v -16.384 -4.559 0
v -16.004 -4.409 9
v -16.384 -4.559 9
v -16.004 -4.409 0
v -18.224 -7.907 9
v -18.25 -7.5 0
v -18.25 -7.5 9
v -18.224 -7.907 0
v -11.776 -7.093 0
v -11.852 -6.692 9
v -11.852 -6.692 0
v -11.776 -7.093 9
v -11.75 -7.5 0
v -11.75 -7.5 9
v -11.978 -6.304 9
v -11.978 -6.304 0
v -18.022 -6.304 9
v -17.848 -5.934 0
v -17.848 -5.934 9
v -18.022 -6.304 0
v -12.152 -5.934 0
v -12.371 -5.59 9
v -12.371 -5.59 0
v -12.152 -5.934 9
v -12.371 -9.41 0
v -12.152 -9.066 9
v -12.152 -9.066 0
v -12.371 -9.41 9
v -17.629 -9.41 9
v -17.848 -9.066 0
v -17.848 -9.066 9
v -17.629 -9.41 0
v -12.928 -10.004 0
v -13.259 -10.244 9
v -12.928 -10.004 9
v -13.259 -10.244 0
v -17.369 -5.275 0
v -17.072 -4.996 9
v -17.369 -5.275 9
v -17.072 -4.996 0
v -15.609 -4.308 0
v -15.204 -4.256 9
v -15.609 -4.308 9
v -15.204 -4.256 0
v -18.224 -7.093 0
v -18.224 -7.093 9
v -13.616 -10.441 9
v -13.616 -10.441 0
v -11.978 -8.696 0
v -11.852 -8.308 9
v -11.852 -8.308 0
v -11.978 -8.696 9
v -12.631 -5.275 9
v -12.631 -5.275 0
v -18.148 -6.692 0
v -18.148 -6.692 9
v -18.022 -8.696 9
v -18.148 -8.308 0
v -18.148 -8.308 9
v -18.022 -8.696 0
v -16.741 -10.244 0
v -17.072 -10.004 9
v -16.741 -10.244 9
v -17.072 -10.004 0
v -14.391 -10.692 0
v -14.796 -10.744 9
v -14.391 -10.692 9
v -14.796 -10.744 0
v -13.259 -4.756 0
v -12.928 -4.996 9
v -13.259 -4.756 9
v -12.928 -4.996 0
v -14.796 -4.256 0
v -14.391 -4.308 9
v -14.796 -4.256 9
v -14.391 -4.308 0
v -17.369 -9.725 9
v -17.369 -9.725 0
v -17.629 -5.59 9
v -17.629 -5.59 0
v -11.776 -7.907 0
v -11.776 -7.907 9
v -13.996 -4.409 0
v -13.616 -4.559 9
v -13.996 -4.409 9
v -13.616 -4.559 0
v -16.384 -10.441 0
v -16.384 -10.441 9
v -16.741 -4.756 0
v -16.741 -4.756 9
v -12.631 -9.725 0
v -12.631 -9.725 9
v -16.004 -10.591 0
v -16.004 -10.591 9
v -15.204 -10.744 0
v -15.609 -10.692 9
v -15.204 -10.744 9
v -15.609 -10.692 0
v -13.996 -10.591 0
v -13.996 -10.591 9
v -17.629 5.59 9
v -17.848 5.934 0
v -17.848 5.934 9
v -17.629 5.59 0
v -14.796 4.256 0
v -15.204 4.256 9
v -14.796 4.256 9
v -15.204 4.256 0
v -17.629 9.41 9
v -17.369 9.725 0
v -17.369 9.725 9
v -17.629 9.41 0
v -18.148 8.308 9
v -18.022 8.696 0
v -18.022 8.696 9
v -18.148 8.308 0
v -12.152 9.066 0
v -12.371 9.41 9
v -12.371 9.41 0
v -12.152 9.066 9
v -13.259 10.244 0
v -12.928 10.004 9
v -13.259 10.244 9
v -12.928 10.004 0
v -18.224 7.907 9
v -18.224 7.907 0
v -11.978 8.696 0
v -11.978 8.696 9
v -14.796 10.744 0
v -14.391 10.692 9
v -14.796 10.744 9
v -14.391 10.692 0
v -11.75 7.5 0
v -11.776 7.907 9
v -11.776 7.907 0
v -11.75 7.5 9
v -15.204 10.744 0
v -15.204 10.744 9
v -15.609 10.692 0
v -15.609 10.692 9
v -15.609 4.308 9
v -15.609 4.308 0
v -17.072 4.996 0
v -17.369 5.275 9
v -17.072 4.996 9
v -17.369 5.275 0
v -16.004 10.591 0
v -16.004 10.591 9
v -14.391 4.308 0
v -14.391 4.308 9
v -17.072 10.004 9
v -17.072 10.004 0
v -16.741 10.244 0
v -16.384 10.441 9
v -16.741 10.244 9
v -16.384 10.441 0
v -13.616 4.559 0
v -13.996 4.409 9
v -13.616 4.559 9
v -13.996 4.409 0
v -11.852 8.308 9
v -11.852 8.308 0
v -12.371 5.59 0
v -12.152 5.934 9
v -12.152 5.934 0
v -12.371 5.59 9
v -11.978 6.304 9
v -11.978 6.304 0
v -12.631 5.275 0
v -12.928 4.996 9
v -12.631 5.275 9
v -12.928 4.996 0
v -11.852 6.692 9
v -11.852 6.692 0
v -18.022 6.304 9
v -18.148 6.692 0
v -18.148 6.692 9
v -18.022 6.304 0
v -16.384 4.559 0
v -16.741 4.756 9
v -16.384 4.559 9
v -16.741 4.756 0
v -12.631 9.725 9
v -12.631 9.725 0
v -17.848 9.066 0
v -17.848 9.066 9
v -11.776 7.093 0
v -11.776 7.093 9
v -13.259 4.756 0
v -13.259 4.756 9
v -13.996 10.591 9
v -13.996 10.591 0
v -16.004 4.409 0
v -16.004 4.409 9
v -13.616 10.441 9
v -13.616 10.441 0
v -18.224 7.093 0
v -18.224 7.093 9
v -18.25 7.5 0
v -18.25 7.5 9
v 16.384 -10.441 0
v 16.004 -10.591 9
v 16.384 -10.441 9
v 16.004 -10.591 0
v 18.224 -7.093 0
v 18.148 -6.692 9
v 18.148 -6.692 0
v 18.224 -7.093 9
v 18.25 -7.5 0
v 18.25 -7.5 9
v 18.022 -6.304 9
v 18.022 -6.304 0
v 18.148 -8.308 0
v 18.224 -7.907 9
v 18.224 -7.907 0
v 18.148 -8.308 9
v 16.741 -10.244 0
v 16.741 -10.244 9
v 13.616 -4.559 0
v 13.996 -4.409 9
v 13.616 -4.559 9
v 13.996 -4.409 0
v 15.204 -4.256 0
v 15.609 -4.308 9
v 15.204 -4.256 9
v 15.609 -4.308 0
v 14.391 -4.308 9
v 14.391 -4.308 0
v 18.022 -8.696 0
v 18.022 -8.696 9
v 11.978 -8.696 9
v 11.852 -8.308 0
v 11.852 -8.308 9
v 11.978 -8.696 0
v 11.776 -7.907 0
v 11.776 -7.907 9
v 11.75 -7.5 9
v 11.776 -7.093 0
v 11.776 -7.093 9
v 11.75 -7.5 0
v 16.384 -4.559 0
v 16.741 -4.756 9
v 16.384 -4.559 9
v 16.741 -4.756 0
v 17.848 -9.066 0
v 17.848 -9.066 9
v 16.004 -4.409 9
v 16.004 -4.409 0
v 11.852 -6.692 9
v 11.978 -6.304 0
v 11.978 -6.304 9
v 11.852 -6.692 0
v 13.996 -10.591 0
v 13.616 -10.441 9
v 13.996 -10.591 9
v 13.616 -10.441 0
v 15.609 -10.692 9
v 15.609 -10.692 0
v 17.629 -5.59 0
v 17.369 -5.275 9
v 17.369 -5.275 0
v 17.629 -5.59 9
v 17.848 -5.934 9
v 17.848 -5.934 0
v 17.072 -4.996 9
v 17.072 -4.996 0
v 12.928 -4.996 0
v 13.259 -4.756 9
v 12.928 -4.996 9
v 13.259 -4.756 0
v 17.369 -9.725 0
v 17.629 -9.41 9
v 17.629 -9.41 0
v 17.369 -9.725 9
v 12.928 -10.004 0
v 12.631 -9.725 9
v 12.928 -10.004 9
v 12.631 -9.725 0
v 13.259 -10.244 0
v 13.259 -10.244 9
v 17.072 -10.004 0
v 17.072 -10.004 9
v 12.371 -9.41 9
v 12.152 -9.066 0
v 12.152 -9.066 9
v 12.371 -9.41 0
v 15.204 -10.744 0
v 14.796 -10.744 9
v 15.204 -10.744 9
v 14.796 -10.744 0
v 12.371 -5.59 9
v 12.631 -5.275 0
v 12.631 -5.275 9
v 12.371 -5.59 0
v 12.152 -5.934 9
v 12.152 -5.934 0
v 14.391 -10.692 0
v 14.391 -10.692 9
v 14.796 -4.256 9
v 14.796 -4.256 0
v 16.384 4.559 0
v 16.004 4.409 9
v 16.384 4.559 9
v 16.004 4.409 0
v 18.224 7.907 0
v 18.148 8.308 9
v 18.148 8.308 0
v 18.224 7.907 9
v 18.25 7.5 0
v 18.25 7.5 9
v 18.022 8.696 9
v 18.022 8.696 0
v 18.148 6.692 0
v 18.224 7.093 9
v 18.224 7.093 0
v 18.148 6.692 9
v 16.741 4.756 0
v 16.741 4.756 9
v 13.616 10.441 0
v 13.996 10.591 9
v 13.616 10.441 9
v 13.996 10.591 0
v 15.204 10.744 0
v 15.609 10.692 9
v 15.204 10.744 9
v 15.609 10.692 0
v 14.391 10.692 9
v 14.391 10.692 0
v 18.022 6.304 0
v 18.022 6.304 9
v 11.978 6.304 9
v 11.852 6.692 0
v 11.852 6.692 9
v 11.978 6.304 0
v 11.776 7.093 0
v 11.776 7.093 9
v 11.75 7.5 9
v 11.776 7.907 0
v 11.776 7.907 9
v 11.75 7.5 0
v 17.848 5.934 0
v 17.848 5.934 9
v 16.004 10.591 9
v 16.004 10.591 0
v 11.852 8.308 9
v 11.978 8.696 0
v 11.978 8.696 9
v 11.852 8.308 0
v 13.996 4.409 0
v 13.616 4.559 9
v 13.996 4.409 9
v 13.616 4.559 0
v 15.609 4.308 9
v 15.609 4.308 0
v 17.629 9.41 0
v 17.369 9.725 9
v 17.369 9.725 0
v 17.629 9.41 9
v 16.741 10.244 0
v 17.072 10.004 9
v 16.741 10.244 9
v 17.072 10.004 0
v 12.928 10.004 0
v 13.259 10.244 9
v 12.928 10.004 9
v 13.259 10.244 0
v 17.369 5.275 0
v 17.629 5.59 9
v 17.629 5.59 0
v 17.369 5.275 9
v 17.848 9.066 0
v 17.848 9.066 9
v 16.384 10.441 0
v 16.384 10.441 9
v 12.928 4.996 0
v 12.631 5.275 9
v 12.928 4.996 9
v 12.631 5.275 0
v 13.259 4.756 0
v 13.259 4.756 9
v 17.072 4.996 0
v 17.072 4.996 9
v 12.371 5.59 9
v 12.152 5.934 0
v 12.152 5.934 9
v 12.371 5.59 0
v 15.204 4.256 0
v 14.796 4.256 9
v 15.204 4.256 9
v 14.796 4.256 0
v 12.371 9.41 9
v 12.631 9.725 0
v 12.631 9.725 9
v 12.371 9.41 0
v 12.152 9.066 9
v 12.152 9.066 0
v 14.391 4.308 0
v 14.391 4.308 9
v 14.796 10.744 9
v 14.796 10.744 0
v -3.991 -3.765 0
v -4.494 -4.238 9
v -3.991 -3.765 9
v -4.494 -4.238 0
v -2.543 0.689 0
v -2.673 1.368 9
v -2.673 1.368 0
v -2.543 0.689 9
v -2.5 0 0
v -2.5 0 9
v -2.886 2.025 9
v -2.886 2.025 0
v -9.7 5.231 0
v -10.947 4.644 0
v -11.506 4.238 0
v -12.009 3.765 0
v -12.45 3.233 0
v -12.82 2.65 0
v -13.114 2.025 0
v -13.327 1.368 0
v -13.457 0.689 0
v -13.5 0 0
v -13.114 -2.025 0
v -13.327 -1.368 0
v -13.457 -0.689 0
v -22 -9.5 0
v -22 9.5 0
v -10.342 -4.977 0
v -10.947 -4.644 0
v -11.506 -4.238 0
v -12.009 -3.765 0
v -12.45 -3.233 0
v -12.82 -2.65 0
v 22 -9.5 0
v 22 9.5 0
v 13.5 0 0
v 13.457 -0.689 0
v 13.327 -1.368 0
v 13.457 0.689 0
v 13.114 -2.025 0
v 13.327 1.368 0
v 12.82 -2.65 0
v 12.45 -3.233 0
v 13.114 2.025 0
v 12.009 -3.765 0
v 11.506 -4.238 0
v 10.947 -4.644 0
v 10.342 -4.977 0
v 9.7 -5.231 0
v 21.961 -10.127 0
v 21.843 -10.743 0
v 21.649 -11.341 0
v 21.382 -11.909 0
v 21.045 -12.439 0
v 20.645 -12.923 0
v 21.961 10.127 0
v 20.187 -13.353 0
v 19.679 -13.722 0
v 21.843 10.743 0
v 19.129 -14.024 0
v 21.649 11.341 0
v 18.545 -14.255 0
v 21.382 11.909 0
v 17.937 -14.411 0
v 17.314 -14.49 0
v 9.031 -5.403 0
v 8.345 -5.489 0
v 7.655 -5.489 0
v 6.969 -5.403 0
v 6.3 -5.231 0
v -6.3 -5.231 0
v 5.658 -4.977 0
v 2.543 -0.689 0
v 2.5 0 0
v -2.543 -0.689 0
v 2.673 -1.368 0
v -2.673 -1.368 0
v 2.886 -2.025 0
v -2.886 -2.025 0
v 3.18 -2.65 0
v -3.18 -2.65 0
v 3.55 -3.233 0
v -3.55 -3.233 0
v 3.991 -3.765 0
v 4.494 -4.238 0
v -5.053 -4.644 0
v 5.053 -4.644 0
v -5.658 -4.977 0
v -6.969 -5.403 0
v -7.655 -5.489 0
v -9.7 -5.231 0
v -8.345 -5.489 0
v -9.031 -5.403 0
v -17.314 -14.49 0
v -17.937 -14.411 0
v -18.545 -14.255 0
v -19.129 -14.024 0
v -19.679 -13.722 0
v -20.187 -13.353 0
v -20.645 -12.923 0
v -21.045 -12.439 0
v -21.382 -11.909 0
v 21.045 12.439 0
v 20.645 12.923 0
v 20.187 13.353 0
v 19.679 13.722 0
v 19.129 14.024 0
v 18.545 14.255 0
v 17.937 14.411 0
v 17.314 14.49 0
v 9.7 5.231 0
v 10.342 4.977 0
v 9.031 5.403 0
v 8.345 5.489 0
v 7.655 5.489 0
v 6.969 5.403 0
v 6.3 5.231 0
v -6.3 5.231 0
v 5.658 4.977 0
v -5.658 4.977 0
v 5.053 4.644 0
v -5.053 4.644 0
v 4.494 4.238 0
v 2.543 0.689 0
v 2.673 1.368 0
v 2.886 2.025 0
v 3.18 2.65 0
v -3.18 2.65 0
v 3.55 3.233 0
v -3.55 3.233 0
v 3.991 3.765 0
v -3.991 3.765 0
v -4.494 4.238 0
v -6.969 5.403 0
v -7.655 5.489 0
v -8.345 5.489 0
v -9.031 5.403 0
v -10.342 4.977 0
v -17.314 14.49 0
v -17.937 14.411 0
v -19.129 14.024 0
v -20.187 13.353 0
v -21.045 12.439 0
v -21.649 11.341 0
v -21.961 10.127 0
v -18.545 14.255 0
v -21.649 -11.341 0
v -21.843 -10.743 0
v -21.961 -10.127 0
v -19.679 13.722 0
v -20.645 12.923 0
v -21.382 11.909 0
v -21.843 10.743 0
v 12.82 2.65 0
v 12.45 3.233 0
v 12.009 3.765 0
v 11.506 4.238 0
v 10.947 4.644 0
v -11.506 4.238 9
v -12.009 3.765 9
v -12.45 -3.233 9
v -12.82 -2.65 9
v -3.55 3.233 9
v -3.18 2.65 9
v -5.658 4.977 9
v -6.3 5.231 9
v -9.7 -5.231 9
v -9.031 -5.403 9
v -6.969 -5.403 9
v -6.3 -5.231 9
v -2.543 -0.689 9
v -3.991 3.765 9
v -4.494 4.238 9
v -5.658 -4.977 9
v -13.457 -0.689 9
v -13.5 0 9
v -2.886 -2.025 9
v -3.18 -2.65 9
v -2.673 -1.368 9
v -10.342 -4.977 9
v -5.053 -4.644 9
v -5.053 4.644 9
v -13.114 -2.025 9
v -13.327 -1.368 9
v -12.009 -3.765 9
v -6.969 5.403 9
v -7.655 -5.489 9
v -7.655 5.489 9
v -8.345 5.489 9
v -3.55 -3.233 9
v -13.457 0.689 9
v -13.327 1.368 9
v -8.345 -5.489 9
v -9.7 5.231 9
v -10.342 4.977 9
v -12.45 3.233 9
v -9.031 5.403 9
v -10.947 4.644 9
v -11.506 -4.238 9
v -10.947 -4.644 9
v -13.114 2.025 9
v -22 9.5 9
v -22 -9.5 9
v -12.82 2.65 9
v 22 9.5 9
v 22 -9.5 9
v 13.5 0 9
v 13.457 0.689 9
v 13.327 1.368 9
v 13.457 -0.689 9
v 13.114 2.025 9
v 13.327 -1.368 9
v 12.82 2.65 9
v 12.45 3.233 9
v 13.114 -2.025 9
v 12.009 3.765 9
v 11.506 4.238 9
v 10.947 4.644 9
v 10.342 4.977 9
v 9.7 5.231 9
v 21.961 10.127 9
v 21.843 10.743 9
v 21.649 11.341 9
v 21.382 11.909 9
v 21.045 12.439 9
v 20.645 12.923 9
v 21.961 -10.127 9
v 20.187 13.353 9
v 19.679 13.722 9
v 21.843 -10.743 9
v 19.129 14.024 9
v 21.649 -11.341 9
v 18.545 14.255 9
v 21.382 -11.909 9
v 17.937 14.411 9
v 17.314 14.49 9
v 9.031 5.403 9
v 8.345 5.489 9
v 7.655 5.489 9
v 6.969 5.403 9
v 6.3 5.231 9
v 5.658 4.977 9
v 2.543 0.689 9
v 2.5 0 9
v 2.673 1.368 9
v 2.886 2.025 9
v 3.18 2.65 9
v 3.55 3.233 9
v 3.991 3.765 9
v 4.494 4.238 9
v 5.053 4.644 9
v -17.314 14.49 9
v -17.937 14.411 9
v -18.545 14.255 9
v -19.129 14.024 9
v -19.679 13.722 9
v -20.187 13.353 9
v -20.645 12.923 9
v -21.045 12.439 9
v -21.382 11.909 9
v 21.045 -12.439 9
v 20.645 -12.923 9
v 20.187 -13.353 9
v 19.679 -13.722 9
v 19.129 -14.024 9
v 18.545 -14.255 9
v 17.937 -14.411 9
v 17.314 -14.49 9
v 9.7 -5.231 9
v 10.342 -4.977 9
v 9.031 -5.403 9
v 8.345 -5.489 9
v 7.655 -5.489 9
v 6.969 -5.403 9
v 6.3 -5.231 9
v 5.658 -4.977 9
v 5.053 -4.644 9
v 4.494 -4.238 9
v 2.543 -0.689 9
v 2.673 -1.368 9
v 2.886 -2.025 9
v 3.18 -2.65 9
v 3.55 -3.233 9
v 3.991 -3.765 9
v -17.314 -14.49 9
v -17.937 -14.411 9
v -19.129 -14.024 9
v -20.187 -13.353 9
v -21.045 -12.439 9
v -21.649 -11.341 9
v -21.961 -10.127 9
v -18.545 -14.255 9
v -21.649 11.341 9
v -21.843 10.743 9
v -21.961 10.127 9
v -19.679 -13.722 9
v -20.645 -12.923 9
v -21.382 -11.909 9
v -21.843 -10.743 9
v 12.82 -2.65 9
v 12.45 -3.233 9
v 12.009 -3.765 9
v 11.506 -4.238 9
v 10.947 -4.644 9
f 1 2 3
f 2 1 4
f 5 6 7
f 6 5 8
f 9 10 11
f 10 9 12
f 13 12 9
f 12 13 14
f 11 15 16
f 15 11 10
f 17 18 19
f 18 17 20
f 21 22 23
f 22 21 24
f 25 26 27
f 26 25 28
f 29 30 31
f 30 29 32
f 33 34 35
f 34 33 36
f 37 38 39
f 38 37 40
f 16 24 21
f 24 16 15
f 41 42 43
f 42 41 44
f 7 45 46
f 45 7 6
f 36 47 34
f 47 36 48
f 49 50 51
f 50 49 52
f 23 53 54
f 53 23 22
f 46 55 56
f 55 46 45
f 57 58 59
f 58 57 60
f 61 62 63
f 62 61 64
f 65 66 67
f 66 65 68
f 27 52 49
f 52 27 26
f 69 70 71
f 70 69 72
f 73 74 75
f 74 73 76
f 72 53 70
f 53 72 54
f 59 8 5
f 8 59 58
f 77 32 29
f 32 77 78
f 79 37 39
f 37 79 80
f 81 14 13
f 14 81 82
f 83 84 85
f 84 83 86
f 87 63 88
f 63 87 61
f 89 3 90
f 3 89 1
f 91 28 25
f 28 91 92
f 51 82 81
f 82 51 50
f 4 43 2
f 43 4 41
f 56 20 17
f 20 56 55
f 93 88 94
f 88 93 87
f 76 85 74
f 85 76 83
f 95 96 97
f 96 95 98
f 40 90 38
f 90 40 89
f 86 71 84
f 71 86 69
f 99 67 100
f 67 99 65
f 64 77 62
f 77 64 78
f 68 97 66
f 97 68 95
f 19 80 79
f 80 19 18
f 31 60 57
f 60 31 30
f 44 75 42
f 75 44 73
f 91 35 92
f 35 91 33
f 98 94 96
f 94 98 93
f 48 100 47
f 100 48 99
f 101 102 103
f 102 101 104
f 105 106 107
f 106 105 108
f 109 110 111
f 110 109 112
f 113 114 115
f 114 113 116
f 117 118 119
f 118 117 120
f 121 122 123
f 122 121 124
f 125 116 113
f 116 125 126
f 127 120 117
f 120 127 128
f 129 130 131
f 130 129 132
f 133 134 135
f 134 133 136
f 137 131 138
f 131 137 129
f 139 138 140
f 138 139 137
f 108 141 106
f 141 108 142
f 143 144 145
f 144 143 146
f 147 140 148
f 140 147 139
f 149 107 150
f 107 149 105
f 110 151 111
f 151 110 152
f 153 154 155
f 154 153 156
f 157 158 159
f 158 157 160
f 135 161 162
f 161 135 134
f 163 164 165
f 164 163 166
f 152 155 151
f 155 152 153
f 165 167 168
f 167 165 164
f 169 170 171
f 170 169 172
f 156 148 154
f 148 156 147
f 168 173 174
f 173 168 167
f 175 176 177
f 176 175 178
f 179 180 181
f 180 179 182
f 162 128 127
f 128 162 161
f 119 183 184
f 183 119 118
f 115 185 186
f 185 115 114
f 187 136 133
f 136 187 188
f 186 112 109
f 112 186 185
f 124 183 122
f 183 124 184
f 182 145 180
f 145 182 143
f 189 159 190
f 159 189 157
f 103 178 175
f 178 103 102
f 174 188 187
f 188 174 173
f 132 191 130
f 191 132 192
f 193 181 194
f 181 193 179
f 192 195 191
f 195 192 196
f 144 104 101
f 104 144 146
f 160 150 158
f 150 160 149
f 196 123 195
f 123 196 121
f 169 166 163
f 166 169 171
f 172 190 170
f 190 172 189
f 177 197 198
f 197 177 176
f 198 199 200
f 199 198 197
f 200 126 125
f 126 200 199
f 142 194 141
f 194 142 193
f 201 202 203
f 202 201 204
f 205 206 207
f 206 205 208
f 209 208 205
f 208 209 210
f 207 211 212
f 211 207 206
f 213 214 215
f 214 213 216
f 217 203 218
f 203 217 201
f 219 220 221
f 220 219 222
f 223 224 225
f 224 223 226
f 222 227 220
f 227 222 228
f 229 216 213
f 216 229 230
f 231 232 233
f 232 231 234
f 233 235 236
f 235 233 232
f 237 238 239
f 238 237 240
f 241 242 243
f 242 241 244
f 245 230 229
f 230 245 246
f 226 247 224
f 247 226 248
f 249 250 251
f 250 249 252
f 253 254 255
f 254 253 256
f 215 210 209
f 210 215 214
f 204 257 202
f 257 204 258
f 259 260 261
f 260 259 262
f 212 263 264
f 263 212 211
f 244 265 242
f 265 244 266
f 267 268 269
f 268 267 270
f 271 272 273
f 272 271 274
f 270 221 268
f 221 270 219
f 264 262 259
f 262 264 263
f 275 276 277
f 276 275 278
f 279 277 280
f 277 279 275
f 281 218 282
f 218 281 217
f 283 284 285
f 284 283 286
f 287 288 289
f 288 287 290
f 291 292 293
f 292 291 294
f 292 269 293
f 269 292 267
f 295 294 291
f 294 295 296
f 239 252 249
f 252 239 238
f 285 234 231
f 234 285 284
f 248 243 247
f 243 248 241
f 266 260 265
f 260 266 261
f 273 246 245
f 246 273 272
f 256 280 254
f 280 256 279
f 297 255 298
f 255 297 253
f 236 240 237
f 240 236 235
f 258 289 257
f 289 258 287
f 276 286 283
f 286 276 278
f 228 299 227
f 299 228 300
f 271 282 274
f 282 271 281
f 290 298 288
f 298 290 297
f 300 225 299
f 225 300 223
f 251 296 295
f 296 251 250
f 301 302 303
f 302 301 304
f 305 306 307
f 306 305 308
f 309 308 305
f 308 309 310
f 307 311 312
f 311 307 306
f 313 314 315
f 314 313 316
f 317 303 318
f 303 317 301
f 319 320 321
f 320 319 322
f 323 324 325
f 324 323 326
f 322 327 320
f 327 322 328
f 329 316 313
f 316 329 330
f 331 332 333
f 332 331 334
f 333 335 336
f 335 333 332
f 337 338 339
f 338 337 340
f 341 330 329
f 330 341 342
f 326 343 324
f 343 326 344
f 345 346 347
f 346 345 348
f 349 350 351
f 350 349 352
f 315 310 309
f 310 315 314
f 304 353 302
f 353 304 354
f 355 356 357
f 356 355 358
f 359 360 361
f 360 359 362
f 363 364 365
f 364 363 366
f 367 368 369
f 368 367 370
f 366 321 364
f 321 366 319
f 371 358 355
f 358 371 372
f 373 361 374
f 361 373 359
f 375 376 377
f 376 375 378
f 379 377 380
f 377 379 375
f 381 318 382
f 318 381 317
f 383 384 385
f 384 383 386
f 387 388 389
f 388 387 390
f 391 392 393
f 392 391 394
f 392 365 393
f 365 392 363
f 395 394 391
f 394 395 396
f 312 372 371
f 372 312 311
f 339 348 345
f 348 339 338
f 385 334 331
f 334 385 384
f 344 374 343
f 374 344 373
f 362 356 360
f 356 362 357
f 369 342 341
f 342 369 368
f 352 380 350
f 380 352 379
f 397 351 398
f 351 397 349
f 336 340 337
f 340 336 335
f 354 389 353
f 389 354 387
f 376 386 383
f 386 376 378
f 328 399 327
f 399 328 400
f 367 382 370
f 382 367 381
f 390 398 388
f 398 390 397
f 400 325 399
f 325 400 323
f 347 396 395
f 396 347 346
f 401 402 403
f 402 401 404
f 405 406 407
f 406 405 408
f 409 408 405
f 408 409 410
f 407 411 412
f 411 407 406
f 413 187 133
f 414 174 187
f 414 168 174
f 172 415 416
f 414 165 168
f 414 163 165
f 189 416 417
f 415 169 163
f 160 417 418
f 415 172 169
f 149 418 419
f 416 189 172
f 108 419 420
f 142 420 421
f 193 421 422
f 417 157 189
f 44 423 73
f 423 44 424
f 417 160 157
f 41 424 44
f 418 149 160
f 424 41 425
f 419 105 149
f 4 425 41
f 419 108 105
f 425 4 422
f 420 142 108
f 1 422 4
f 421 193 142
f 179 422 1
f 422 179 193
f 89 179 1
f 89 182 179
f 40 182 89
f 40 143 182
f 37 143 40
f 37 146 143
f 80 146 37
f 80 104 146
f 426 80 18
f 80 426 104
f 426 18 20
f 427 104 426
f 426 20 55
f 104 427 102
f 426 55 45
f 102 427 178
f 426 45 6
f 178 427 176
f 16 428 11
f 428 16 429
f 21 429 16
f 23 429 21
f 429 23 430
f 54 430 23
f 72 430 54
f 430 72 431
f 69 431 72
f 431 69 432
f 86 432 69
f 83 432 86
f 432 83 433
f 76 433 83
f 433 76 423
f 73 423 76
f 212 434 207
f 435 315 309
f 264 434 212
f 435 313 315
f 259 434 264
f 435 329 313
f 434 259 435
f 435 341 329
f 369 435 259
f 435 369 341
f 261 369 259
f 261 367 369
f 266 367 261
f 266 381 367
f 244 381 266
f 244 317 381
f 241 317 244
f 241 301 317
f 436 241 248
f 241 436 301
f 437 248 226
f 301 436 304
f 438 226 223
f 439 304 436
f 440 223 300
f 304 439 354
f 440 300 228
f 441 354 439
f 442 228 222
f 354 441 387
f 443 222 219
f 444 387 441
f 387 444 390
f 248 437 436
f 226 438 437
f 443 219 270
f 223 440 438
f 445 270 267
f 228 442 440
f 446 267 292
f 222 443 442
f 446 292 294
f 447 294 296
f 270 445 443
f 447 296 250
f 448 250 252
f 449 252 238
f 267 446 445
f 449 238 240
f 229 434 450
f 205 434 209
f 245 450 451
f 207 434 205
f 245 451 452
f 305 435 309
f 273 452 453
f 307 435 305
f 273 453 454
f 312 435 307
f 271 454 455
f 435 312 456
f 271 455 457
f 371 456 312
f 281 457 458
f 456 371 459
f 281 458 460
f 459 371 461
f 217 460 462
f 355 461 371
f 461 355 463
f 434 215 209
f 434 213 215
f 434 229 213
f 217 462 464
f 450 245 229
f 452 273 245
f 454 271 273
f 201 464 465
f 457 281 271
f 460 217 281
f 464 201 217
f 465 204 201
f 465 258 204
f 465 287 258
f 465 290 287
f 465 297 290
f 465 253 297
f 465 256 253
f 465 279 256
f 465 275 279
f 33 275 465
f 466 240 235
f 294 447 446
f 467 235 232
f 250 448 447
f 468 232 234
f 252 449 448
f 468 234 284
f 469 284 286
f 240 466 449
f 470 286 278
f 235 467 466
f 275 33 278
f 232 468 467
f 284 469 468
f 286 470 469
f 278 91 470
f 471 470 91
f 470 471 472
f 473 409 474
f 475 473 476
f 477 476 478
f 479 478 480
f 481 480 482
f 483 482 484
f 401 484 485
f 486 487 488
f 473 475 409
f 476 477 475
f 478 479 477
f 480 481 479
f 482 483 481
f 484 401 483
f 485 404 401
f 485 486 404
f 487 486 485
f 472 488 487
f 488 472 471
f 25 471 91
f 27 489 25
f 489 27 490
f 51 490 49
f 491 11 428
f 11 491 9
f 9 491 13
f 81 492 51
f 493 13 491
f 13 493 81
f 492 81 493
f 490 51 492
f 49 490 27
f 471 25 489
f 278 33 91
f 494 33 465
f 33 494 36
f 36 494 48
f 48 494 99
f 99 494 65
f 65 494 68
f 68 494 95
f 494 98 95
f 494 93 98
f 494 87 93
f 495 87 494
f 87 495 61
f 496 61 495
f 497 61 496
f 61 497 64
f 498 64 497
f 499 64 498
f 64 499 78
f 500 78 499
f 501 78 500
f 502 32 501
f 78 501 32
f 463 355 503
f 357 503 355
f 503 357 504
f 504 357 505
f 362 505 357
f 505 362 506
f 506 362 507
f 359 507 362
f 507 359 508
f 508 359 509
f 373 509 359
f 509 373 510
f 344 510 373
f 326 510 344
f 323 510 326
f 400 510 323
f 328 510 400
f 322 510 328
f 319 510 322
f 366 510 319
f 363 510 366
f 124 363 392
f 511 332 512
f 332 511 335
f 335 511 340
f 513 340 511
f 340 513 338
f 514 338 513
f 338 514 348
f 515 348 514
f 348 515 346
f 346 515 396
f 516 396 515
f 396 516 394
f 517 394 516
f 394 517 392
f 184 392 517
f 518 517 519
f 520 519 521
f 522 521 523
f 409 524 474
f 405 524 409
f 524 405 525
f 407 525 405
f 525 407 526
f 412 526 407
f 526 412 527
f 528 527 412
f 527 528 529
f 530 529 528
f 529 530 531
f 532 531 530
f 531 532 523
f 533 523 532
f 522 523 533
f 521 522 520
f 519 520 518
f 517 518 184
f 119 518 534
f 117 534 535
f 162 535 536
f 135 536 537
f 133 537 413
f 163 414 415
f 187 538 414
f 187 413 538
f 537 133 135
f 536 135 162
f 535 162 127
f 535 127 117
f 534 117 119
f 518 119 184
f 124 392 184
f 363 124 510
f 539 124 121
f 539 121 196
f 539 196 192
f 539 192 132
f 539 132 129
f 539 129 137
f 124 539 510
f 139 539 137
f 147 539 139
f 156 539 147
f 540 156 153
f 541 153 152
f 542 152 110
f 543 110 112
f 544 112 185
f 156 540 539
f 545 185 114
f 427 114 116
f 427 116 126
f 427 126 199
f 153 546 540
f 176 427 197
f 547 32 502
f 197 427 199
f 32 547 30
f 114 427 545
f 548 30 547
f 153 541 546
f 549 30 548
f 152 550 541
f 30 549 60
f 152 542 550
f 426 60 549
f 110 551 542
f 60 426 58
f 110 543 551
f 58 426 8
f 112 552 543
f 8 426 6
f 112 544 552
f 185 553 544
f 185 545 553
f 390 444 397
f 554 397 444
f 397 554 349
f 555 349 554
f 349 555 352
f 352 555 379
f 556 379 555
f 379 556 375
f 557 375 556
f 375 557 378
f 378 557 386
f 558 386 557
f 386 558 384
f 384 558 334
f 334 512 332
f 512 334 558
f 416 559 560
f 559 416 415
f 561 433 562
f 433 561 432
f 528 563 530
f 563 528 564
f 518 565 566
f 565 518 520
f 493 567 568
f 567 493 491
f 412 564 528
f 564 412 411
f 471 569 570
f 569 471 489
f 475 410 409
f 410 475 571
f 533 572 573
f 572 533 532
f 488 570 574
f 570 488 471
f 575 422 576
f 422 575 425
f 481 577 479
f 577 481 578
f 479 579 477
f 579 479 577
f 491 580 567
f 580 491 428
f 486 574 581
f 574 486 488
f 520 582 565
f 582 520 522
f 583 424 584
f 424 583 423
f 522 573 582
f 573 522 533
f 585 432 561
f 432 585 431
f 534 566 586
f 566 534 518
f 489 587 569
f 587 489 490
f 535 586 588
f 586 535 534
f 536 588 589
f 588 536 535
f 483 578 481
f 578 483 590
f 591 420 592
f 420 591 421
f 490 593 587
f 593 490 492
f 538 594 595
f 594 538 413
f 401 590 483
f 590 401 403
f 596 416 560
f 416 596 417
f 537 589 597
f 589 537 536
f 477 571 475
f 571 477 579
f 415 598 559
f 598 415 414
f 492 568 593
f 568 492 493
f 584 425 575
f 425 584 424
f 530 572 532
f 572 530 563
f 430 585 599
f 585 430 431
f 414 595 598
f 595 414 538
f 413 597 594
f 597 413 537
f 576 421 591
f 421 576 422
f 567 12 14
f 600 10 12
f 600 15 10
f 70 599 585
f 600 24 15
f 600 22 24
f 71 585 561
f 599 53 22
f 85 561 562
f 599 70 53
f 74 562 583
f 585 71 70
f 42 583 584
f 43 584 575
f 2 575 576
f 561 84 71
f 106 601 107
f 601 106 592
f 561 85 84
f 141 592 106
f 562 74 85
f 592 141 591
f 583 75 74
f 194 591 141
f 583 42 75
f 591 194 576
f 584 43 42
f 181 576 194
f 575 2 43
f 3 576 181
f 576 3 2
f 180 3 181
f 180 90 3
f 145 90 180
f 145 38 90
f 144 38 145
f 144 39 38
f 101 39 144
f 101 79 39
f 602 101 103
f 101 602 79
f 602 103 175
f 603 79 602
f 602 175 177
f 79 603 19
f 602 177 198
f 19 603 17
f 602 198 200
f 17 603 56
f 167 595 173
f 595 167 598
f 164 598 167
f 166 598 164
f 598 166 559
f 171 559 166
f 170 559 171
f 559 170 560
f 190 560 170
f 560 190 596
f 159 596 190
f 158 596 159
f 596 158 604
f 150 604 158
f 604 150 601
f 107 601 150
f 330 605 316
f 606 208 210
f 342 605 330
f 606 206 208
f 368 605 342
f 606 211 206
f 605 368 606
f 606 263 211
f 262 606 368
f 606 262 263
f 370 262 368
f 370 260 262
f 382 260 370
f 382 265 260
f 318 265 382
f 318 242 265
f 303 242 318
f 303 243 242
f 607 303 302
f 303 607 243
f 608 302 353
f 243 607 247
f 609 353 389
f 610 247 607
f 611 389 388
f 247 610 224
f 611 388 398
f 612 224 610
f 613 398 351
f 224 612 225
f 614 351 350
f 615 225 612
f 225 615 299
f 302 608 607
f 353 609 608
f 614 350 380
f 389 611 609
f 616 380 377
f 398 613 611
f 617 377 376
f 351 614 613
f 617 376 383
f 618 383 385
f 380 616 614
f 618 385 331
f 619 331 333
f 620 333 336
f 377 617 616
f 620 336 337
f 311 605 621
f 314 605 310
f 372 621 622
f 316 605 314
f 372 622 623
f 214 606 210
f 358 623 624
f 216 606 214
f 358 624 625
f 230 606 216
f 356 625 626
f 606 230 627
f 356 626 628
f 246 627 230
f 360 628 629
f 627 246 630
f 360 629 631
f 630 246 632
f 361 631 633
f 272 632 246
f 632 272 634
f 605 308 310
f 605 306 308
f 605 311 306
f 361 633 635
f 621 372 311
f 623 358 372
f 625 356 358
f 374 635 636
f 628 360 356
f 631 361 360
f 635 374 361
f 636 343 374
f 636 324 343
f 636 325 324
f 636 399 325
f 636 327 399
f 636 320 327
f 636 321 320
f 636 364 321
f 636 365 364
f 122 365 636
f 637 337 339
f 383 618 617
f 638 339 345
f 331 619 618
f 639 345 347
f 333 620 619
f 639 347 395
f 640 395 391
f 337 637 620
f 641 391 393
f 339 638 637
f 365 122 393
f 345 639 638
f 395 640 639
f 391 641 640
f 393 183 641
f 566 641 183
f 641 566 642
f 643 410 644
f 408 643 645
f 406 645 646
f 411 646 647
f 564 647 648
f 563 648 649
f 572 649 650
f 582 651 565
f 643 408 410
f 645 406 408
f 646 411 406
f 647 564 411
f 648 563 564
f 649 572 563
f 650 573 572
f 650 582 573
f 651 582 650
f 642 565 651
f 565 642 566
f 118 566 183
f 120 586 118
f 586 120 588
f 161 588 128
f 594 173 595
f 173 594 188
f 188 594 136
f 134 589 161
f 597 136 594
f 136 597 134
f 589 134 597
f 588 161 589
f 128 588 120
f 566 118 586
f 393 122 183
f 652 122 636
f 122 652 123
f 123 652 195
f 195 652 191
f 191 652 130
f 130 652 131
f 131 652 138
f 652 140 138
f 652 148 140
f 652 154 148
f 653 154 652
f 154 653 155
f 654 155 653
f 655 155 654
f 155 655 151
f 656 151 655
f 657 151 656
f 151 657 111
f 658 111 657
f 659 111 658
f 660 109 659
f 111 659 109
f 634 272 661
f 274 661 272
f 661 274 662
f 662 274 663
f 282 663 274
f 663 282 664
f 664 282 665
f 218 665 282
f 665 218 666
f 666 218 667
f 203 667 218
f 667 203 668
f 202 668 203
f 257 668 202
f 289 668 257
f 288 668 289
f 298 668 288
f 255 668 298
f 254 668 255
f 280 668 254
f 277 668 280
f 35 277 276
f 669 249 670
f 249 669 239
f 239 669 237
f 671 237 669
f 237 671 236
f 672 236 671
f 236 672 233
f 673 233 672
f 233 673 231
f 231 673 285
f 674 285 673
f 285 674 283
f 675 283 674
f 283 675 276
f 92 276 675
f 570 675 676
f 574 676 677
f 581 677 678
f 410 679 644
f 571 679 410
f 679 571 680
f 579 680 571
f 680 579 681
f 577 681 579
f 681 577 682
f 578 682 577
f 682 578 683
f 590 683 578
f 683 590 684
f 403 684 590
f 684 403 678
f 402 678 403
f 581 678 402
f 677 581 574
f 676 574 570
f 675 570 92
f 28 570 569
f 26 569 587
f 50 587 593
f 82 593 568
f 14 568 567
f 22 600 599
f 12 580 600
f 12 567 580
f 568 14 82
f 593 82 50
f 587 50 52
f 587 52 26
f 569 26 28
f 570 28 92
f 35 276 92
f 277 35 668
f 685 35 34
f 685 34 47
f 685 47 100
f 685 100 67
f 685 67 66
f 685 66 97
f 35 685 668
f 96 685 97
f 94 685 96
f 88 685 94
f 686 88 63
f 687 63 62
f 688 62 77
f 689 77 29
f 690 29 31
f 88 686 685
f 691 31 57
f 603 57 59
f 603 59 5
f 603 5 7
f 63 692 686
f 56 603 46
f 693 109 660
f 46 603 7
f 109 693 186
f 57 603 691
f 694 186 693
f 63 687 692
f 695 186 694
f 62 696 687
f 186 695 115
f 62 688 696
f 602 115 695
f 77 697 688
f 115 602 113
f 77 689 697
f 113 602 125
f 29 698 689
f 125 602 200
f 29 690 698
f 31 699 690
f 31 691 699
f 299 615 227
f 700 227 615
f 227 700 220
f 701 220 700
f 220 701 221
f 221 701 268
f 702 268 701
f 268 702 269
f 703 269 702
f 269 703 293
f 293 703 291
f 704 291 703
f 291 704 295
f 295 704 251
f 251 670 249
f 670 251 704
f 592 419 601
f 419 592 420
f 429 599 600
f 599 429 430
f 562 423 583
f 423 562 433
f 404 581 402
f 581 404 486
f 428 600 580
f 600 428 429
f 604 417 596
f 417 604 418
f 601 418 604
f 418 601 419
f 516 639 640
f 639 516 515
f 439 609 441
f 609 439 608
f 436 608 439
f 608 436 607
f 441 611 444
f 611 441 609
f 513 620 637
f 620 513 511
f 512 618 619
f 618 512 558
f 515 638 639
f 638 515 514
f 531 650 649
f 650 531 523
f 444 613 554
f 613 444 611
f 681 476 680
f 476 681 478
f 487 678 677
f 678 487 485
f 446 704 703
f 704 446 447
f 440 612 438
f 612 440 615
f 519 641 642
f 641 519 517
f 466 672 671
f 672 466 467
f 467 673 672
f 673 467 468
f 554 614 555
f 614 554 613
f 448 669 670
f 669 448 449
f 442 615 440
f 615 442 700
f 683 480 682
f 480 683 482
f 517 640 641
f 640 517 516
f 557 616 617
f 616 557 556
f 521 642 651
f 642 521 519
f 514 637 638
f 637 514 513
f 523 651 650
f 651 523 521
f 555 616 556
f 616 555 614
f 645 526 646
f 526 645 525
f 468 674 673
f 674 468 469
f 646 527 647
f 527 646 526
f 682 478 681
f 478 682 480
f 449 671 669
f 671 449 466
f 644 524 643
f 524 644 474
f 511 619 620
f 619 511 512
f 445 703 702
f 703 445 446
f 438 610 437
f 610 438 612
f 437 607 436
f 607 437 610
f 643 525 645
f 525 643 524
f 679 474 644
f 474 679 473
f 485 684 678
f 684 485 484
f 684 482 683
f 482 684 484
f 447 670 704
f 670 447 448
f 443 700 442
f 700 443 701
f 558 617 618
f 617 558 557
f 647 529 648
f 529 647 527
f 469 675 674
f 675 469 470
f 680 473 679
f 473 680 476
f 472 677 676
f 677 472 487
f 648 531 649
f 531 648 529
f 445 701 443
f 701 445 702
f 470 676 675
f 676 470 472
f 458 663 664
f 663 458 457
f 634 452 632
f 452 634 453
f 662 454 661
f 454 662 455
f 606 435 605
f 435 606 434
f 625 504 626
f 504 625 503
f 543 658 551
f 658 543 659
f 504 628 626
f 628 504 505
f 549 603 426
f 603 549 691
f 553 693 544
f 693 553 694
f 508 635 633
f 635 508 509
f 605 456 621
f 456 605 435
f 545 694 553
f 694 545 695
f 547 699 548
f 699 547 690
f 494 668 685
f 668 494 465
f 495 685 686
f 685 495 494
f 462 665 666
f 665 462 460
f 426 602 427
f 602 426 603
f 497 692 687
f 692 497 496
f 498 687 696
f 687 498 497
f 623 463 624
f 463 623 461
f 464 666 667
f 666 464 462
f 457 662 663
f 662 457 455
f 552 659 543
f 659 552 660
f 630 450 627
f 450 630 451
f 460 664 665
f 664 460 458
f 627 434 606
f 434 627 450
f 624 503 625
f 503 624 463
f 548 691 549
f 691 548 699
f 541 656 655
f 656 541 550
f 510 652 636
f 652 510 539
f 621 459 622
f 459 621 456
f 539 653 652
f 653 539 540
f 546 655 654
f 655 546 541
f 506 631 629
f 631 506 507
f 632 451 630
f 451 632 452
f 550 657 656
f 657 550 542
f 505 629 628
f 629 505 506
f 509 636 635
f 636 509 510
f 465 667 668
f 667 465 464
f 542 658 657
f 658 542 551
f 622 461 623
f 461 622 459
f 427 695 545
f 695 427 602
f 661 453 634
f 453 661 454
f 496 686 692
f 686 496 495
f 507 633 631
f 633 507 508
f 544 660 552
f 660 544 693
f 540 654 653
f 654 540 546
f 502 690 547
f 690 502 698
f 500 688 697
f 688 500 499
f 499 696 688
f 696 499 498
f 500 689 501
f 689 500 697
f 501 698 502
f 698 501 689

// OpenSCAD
$fn = 50;


difference() {
	union() {
		hull() {
			translate(v = [-17.0000000000, 9.5000000000, 0]) {
				cylinder(h = 9, r = 5);
			}
			translate(v = [17.0000000000, 9.5000000000, 0]) {
				cylinder(h = 9, r = 5);
			}
			translate(v = [-17.0000000000, -9.5000000000, 0]) {
				cylinder(h = 9, r = 5);
			}
			translate(v = [17.0000000000, -9.5000000000, 0]) {
				cylinder(h = 9, r = 5);
			}
		}
	}
	union() {
		#translate(v = [-15.0000000000, -7.5000000000, -100.0000000000]) {
			cylinder(h = 200, r = 3.2500000000);
		}
		#translate(v = [-15.0000000000, 7.5000000000, -100.0000000000]) {
			cylinder(h = 200, r = 3.2500000000);
		}
		#translate(v = [15.0000000000, -7.5000000000, -100.0000000000]) {
			cylinder(h = 200, r = 3.2500000000);
		}
		#translate(v = [15.0000000000, 7.5000000000, -100.0000000000]) {
			cylinder(h = 200, r = 3.2500000000);
		}
		#translate(v = [-8.0000000000, 0, 0]) {
			cylinder(h = 9, r = 5.5000000000);
		}
		#translate(v = [8.0000000000, 0, 0]) {
			cylinder(h = 9, r = 5.5000000000);
		}
	}
}
